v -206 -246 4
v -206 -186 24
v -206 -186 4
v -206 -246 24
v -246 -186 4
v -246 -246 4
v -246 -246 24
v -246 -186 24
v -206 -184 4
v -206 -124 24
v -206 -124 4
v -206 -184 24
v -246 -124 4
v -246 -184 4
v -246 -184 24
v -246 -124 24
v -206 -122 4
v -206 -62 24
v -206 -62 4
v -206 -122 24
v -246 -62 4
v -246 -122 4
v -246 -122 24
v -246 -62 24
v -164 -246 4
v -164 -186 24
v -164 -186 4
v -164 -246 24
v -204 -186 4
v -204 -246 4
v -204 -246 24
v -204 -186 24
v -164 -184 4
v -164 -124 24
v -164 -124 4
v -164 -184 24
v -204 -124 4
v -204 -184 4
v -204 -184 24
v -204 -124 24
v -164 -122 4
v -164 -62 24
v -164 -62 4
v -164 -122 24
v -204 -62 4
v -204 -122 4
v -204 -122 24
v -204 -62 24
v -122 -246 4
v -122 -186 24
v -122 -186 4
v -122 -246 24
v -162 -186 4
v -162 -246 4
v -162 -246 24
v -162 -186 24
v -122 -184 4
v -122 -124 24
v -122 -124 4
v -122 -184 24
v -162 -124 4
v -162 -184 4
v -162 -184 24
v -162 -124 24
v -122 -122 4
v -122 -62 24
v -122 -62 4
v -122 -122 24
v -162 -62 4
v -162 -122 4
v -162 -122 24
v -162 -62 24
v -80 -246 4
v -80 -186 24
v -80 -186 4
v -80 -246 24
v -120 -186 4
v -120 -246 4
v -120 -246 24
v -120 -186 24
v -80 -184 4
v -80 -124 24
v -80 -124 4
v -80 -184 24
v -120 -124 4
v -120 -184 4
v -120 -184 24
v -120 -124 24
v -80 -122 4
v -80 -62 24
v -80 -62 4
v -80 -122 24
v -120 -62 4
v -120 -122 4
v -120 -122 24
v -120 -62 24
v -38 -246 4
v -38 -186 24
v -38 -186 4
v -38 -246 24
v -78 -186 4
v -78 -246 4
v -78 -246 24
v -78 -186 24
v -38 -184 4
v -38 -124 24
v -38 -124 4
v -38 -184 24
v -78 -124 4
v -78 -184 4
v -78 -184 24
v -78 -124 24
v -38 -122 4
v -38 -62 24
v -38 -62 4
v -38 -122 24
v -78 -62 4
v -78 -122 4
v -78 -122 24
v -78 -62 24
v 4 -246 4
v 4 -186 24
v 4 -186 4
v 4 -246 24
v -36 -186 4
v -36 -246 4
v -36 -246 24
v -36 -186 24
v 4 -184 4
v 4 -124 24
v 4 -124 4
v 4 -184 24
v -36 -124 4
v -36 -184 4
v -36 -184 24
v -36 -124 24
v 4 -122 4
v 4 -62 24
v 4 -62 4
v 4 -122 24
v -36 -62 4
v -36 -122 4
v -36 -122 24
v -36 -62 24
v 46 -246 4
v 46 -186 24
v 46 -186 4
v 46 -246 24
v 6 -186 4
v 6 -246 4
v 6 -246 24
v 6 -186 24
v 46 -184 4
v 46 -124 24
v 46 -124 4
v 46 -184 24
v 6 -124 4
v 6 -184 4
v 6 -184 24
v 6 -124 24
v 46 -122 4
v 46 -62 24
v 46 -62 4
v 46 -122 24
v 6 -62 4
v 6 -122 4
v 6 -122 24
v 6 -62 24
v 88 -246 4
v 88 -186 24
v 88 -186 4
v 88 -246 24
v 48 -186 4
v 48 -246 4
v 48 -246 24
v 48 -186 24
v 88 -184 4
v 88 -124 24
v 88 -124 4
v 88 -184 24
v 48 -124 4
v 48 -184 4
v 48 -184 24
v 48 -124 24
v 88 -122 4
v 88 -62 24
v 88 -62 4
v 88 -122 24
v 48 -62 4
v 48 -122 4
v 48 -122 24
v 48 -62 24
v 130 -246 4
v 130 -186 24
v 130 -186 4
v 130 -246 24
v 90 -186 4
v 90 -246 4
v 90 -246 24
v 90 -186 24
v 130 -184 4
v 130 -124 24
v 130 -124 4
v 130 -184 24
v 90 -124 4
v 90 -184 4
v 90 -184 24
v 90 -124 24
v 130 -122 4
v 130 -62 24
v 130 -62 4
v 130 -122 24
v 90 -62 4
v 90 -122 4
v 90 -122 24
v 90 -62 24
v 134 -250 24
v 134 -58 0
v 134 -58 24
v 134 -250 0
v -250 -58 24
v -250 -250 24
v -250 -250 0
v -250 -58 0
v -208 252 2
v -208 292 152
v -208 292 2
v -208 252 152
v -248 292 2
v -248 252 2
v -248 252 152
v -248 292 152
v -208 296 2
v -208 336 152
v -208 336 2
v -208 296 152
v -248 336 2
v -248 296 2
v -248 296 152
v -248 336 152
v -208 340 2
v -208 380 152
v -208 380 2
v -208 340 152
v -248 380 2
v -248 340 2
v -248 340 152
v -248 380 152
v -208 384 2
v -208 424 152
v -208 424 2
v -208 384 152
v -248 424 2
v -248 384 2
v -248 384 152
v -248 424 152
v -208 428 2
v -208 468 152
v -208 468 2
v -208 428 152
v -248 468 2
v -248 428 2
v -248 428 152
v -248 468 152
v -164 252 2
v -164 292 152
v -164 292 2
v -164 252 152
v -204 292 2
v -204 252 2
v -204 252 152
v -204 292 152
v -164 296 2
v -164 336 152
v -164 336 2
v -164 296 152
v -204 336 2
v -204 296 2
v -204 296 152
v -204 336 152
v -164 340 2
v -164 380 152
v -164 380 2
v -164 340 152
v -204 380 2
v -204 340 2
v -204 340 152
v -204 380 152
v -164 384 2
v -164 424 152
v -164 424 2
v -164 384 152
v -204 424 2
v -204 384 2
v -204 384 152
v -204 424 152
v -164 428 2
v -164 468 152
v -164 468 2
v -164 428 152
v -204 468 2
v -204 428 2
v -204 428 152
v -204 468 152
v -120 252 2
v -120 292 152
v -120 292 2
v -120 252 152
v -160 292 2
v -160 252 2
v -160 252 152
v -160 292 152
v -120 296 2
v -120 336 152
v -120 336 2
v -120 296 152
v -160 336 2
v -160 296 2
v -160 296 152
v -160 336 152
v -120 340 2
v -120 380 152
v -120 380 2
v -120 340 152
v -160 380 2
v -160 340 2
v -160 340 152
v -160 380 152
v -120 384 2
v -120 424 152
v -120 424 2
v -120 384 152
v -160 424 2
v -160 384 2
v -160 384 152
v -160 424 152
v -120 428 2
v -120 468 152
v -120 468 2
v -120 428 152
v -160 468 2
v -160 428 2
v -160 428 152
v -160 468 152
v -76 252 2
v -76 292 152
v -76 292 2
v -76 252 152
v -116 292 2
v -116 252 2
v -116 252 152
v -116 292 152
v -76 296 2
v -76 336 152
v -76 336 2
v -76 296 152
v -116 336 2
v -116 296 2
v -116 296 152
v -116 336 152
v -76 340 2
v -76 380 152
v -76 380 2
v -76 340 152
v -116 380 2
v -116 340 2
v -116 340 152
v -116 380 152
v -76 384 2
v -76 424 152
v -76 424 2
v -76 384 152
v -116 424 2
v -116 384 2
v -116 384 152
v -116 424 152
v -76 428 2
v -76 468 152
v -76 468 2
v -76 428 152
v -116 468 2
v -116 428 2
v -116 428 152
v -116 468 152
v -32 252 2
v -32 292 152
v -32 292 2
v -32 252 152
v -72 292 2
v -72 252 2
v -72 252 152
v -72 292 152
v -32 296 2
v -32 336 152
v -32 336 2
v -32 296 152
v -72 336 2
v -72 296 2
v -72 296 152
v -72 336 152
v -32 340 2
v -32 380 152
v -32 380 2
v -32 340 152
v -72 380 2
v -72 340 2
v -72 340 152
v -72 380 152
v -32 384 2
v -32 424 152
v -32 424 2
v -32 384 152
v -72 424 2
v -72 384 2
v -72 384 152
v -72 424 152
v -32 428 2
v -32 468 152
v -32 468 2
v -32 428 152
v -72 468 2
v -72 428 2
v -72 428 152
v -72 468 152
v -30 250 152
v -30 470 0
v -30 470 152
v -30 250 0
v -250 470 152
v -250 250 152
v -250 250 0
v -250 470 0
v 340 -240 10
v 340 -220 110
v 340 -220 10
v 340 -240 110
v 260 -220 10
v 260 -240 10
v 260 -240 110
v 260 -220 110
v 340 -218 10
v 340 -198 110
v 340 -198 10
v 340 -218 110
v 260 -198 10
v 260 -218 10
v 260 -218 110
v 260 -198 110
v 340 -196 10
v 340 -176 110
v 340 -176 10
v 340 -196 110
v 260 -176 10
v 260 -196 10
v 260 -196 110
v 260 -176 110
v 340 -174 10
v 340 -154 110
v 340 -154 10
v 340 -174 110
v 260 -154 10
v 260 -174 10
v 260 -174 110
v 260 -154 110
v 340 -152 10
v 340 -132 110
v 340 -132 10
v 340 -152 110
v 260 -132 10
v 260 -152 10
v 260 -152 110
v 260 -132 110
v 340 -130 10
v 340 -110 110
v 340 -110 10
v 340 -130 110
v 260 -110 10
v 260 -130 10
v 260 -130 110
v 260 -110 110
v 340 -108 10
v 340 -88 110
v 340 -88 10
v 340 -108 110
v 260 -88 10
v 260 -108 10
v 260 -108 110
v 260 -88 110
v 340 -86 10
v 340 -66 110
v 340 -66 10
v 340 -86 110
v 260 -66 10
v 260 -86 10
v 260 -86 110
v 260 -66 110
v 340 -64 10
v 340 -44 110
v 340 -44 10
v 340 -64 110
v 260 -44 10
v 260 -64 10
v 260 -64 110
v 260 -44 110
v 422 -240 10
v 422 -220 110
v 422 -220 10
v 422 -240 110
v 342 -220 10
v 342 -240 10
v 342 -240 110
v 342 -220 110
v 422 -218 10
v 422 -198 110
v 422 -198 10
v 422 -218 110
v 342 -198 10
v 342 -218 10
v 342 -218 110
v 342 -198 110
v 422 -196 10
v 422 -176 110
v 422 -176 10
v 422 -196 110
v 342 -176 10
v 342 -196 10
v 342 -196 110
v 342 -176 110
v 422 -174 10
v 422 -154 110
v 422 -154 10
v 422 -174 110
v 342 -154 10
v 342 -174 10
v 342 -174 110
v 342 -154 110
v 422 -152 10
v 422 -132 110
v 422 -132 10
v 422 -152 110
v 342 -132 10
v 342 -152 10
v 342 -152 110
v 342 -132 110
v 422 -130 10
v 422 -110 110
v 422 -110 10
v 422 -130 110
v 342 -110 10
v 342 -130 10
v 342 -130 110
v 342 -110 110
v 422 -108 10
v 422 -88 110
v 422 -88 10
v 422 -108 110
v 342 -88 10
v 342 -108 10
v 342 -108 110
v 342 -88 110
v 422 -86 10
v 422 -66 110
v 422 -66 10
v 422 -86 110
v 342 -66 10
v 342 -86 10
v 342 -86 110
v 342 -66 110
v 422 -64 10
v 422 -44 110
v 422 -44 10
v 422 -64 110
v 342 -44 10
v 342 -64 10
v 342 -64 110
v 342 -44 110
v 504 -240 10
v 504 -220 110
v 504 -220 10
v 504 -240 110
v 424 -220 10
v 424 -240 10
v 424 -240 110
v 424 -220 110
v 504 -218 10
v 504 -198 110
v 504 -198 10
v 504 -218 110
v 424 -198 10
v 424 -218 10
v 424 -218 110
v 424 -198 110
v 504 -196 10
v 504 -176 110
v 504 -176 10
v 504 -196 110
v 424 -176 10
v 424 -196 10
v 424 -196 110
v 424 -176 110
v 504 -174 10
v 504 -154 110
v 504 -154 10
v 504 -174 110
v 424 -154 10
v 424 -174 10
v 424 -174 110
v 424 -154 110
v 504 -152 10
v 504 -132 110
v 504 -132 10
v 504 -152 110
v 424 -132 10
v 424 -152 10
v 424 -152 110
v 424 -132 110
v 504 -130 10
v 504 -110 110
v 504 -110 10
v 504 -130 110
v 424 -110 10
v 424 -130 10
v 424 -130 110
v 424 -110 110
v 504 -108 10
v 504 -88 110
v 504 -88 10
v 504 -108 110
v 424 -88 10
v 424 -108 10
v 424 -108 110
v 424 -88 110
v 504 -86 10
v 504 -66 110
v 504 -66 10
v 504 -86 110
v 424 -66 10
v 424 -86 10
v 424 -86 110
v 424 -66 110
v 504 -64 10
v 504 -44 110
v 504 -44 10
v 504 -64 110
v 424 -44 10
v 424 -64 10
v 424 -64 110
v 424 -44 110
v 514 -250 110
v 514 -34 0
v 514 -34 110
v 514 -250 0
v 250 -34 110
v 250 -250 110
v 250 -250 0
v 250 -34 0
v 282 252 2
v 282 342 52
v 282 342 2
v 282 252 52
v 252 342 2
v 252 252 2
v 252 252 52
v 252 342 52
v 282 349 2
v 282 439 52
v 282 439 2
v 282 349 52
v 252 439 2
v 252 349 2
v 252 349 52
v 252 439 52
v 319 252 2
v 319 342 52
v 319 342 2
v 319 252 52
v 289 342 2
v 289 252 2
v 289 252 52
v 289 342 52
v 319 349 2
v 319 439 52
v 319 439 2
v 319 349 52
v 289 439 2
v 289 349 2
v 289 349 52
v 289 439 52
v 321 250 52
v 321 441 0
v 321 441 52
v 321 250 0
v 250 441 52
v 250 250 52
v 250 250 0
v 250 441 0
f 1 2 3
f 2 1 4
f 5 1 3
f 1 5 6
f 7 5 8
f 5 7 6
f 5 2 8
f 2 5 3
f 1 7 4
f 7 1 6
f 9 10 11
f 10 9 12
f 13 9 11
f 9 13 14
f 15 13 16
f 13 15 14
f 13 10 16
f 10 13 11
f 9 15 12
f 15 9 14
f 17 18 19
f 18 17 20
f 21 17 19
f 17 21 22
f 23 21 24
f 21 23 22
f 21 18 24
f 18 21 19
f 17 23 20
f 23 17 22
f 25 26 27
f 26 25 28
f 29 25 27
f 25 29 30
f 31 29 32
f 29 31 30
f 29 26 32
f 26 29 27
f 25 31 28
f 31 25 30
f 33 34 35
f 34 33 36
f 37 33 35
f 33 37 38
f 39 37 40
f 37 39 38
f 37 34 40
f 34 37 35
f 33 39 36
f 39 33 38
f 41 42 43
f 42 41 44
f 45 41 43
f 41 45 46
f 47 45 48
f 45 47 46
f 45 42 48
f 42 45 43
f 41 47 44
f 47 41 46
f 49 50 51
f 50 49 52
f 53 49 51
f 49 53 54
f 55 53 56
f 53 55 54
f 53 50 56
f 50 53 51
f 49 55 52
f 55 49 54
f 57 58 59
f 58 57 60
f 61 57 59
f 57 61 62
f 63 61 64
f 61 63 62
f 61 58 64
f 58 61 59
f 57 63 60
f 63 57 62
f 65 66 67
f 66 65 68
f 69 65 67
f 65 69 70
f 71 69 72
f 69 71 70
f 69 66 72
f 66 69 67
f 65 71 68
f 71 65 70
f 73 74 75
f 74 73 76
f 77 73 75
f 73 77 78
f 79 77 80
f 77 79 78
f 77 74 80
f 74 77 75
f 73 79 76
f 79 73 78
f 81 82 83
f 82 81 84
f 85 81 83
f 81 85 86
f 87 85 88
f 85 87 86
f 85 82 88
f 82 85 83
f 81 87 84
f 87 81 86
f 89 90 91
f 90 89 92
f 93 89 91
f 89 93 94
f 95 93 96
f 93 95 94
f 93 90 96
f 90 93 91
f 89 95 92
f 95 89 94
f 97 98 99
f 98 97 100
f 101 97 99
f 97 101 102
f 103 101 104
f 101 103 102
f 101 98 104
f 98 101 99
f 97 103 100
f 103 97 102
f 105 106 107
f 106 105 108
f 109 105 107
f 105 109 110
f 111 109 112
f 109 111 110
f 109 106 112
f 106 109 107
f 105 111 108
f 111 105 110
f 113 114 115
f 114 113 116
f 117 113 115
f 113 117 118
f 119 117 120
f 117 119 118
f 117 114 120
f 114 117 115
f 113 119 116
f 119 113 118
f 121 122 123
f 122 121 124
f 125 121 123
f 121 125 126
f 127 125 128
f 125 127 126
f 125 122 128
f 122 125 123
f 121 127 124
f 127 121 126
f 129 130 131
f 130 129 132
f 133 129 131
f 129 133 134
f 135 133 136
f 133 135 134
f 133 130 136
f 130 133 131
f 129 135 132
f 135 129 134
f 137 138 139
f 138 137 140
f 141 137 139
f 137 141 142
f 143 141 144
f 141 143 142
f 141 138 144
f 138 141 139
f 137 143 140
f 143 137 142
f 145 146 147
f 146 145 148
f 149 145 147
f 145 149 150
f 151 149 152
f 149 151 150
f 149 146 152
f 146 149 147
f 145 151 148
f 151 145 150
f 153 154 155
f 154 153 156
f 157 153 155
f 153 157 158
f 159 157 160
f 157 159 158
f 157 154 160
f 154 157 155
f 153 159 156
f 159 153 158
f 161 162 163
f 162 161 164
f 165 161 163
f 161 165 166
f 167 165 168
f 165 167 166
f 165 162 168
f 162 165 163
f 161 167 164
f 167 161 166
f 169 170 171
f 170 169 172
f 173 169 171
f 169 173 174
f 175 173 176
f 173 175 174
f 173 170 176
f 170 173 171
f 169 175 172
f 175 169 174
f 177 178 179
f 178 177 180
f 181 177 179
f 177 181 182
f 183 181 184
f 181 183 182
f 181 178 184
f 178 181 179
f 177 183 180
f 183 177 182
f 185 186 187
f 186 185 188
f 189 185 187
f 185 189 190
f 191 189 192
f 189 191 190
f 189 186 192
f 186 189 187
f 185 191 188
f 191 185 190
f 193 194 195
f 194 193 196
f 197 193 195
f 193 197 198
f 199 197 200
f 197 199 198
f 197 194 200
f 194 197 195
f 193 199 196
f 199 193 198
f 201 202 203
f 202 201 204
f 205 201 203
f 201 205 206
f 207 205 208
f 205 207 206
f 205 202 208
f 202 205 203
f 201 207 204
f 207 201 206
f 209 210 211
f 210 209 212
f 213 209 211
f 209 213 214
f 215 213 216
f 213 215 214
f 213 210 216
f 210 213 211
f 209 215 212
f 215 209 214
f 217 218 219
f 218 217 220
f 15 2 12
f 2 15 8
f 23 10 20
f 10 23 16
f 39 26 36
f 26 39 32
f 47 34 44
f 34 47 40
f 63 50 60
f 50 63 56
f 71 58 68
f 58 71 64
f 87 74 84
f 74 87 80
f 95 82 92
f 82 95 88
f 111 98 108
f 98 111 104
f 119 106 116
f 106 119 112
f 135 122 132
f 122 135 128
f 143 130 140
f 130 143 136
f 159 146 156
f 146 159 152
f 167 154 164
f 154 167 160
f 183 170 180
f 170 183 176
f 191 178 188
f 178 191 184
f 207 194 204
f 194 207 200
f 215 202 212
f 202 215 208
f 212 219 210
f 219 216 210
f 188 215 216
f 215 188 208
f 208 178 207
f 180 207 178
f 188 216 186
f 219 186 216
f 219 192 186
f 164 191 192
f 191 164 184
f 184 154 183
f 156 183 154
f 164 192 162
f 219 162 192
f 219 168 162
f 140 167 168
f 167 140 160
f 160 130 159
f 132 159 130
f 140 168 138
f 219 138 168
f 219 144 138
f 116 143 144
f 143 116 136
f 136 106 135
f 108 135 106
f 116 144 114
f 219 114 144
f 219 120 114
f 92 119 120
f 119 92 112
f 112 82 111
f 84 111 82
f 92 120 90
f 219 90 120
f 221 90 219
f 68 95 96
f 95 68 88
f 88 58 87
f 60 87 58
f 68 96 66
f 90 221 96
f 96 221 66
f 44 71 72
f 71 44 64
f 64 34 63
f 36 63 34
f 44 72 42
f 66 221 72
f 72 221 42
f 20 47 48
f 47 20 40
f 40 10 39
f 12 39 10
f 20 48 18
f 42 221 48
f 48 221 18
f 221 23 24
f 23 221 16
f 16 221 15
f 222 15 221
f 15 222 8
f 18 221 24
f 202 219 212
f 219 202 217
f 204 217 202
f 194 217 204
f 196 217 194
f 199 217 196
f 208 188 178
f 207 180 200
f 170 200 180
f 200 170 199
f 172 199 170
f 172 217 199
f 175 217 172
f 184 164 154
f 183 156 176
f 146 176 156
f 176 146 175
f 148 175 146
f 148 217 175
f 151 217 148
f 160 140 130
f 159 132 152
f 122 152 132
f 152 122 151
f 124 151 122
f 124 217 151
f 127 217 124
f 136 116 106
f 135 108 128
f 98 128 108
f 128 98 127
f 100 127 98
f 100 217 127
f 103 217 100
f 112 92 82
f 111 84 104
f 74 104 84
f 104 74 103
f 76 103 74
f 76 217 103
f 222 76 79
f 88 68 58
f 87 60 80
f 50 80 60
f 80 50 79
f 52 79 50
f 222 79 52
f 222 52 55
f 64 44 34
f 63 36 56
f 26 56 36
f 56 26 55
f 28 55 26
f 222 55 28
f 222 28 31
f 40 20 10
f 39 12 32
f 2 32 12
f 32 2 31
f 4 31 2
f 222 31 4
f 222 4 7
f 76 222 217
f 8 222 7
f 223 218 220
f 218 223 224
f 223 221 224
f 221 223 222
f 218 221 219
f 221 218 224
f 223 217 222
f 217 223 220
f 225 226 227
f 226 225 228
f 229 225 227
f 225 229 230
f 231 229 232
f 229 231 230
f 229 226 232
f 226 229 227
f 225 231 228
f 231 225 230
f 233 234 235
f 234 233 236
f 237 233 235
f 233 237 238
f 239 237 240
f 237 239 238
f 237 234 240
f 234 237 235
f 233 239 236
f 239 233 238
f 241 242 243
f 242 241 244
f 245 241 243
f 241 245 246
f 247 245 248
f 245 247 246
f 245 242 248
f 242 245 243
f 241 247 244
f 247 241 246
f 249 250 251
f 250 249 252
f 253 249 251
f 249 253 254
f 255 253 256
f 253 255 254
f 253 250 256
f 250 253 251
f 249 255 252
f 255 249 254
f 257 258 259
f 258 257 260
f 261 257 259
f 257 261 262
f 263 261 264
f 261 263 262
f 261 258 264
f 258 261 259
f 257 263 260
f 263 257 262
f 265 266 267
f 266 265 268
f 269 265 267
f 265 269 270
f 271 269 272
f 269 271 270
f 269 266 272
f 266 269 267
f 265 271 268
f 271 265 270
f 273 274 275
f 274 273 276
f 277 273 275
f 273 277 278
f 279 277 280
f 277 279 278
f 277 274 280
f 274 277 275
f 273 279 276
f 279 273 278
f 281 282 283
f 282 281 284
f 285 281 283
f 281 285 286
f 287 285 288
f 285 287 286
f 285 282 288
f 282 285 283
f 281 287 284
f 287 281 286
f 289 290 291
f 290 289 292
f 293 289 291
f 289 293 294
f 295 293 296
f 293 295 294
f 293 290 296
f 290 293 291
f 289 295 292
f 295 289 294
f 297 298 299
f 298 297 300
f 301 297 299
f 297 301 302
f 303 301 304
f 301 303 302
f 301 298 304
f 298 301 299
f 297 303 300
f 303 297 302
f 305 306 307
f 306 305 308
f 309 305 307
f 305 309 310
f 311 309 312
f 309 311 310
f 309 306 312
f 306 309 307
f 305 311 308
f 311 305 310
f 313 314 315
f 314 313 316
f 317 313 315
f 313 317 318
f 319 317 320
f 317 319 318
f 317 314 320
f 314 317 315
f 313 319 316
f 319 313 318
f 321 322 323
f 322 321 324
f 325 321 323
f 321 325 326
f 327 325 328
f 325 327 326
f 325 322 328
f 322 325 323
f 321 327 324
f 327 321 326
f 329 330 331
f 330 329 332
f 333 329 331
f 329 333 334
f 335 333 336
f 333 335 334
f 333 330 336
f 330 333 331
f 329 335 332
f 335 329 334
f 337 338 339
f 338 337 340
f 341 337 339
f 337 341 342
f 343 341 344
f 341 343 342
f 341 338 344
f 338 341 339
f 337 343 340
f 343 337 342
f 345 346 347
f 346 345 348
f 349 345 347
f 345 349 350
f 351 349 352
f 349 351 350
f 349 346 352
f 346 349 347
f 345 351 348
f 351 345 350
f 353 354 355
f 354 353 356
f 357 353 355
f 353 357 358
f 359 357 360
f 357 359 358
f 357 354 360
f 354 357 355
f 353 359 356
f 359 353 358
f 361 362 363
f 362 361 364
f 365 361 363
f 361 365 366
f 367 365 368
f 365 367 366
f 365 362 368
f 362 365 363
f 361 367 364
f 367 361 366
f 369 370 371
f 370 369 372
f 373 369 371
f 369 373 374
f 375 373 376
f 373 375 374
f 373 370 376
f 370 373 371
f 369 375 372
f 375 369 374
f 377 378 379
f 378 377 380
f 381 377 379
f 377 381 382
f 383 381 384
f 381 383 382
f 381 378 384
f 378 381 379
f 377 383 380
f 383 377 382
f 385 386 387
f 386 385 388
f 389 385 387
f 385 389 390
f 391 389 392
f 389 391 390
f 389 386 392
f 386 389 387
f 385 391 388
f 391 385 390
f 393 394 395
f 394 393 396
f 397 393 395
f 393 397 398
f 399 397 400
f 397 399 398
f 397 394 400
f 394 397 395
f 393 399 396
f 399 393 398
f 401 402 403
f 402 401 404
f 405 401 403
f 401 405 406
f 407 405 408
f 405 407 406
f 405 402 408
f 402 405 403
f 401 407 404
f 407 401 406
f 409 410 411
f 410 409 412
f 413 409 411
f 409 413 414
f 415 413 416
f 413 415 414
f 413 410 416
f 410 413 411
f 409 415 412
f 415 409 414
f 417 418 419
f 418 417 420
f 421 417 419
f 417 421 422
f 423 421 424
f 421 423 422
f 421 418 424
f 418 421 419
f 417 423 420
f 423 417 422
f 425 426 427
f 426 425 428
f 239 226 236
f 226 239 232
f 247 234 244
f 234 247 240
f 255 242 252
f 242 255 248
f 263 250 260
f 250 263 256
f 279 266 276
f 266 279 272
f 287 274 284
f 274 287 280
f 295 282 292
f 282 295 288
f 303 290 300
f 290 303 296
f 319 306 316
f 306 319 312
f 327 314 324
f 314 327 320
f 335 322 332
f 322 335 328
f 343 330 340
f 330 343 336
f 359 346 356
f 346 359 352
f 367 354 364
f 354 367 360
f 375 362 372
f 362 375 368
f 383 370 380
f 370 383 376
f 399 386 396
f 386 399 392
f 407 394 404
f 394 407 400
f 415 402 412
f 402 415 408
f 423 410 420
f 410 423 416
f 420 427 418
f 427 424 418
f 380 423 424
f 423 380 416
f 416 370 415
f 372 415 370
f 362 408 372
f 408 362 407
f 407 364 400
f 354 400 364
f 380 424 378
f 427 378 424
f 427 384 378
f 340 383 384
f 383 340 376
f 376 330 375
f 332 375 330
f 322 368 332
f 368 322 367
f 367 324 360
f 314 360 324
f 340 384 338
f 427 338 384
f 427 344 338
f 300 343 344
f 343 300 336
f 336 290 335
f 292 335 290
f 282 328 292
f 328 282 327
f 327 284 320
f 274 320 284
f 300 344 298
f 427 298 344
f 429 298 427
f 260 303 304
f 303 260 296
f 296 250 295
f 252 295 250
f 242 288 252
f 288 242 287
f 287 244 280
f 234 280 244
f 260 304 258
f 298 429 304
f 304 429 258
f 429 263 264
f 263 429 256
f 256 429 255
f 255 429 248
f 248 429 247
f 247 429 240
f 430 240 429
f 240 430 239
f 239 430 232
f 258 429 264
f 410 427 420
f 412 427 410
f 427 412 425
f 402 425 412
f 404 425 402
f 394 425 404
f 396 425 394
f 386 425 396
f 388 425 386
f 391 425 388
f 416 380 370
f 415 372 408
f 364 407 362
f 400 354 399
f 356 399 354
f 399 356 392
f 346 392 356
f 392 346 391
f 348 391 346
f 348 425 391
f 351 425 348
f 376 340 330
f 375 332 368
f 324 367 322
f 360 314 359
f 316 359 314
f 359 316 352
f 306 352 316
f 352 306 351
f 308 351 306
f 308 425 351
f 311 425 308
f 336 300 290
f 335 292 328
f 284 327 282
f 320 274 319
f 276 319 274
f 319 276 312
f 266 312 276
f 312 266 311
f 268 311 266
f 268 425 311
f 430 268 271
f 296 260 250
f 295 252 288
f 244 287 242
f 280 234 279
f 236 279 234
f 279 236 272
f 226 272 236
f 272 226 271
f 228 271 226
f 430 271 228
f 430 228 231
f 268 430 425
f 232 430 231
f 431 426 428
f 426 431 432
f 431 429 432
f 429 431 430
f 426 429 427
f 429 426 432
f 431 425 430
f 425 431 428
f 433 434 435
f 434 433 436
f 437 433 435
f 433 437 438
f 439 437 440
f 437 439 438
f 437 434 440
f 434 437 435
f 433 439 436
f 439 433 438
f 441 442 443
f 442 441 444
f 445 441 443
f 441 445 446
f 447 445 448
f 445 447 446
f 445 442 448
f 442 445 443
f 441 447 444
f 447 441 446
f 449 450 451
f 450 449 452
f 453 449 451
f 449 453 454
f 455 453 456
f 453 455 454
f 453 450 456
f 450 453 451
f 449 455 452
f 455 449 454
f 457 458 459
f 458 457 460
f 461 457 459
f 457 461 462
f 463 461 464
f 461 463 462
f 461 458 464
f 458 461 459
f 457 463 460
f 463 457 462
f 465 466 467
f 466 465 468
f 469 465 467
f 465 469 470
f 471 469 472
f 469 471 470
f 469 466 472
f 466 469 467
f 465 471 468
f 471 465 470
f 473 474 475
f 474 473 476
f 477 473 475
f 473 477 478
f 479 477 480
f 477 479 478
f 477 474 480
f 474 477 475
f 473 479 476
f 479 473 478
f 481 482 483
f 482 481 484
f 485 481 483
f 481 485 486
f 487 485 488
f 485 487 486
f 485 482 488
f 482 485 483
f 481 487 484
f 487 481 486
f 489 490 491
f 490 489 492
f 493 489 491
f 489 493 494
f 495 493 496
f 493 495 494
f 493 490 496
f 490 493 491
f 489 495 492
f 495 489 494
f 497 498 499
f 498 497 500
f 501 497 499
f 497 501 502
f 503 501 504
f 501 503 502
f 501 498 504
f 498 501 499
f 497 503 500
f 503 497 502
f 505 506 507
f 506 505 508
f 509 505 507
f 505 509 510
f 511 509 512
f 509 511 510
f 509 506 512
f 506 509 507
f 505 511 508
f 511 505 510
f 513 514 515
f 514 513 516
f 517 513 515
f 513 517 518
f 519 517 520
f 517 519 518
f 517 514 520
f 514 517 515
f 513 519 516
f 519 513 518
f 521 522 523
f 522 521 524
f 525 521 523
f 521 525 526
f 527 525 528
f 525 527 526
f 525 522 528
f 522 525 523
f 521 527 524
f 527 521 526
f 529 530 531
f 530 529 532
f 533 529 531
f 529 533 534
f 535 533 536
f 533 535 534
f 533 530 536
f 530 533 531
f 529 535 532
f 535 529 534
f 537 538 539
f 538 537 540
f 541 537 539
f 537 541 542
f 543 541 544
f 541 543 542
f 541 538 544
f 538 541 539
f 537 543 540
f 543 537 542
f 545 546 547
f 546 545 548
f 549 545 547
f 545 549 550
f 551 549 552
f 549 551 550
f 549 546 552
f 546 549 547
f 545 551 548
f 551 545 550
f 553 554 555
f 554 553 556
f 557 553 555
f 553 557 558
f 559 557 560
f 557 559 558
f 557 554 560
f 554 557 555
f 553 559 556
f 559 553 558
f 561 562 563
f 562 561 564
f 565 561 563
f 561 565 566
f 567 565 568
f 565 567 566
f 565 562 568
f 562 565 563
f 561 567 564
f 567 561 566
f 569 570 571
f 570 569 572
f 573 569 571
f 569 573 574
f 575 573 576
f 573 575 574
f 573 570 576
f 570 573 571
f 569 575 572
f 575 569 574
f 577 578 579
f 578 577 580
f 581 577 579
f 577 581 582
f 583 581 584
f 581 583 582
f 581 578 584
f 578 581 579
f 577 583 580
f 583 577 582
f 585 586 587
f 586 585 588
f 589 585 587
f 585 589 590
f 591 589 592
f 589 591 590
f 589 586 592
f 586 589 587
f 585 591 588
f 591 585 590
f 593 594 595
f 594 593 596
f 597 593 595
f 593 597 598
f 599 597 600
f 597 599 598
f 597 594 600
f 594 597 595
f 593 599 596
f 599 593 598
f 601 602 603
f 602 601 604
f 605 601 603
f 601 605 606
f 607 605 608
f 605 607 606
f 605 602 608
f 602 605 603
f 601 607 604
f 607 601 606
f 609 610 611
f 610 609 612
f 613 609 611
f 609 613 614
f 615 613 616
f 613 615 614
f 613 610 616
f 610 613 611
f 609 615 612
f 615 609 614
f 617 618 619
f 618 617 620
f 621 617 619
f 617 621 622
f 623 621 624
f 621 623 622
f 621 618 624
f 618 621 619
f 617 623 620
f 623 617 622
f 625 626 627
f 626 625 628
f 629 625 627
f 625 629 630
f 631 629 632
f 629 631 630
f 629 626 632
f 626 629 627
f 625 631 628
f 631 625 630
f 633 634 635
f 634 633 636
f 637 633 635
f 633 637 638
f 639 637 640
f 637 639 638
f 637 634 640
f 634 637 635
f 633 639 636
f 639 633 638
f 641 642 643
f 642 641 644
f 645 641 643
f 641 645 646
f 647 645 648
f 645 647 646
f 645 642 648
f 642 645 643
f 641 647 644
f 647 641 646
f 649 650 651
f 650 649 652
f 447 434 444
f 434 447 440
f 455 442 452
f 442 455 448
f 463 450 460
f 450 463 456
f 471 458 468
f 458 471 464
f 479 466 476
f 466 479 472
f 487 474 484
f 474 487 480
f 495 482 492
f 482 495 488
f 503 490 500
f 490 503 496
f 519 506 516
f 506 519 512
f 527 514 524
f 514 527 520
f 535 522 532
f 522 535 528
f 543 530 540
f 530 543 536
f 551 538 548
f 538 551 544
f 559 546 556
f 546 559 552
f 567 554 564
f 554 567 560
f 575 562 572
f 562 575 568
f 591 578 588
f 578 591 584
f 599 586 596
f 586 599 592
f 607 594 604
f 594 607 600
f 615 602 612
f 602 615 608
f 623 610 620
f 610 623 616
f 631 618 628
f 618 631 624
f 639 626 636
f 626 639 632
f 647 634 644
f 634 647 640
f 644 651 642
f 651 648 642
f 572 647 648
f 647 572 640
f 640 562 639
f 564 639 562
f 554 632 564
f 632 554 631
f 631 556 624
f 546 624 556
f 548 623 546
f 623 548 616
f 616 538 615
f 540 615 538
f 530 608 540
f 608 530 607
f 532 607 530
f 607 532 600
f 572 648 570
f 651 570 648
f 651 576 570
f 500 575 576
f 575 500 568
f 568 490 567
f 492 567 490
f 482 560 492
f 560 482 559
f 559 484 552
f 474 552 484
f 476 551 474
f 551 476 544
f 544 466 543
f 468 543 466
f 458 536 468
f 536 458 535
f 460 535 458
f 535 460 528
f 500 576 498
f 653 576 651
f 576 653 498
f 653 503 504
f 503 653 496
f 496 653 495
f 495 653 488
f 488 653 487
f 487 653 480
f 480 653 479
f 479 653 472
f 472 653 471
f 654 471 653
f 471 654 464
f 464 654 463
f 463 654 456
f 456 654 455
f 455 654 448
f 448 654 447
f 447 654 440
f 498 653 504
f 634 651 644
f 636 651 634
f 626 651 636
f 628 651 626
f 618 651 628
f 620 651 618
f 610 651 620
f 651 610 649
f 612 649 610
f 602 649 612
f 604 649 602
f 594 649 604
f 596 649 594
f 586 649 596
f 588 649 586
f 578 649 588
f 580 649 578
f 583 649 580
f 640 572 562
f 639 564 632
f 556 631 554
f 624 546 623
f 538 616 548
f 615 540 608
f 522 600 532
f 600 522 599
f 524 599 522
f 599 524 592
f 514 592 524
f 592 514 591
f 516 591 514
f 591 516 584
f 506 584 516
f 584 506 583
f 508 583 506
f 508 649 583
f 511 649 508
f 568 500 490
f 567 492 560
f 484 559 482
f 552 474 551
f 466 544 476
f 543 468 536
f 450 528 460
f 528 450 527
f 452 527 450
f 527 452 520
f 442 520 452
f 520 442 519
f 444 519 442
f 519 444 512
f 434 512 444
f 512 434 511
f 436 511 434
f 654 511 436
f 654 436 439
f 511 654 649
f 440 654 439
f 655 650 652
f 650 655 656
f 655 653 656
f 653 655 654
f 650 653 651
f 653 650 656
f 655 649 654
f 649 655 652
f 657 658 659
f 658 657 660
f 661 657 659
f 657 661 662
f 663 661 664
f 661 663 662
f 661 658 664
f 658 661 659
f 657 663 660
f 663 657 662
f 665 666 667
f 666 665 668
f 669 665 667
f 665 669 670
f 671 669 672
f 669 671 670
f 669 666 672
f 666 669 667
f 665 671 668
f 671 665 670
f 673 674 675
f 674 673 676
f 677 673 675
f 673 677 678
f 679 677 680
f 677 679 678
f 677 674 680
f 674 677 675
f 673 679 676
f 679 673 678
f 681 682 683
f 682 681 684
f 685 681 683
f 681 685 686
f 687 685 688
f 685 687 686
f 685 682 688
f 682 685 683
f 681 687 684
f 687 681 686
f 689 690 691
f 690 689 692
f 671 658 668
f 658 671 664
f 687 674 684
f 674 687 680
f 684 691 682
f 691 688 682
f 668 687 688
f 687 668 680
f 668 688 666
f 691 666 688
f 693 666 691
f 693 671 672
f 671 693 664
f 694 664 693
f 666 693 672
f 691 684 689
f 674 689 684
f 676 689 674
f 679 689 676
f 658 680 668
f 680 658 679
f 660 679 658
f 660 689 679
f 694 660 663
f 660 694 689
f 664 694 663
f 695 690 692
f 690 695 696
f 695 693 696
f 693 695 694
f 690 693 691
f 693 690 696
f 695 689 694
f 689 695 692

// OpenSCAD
// file: Customizable_CompartmentBox_Symmetrical_InternalDimensions.scad
/* [Holes dimensions] */
// Internal length (X)
lg = 40;
// Internal width (Y)
wd = 60;
// Internal depth (Z)
dp = 100;

/* [Thickness] */
// External thickness
extTk = 4;
// Internal thickness
intTk = 2;

/* [Multipliers] */
// Number multiplier on axe X
multX = 9;
// Number multiplier on axe Y
multY = 3;

module box(lg, wd, dp, extTk, intTk, multX, multY)
{
    difference ()
    {
        // External length (X)
        sizeX = lg*multX + 2*extTk + (multX-1)*intTk; 
        // External width (Y)
        sizeY = wd*multY + 2*extTk + (multY-1)*intTk;
        // External heigth (Z)
        sizeZ = dp + extTk;
        
        // External box
        cube([sizeX, sizeY, sizeZ]);
        
        // Holes
        for (vX=[0:multX-1], vY=[0:multY-1])
            translate([extTk+vX*(lg+intTk), extTk+vY*(wd+intTk),extTk])
            cube([lg, wd, dp+0.1]);
    }
}

box(lg=lg, wd=wd, dp=dp, extTk=extTk, intTk=intTk, multX=multX, multY=multY);
// main file
use <Customizable_CompartmentBox_Symmetrical_InternalDimensions.scad>;

split = 250;

boxes = [[40, 60, 20, 4, 2, 9, 3, "red"],
         [80, 20, 100, 10, 2, 3, 9, "cyan"],
         [40, 40, 150, 2, 4, 5, 5, "magenta"],
         [30, 90, 50, 2, 7, 2, 2, "green"]];

for (vX=[-1,1], vY=[-1,1])
{
    i = max(vX,0) + max(vY,0)*2;
    
    if (boxes[i])
        color(boxes[i][7])
        translate([vX*split, vY*split,0])
        box(boxes[i][0], boxes[i][1], boxes[i][2], boxes[i][3], boxes[i][4], boxes[i][5], boxes[i][6]);
}
